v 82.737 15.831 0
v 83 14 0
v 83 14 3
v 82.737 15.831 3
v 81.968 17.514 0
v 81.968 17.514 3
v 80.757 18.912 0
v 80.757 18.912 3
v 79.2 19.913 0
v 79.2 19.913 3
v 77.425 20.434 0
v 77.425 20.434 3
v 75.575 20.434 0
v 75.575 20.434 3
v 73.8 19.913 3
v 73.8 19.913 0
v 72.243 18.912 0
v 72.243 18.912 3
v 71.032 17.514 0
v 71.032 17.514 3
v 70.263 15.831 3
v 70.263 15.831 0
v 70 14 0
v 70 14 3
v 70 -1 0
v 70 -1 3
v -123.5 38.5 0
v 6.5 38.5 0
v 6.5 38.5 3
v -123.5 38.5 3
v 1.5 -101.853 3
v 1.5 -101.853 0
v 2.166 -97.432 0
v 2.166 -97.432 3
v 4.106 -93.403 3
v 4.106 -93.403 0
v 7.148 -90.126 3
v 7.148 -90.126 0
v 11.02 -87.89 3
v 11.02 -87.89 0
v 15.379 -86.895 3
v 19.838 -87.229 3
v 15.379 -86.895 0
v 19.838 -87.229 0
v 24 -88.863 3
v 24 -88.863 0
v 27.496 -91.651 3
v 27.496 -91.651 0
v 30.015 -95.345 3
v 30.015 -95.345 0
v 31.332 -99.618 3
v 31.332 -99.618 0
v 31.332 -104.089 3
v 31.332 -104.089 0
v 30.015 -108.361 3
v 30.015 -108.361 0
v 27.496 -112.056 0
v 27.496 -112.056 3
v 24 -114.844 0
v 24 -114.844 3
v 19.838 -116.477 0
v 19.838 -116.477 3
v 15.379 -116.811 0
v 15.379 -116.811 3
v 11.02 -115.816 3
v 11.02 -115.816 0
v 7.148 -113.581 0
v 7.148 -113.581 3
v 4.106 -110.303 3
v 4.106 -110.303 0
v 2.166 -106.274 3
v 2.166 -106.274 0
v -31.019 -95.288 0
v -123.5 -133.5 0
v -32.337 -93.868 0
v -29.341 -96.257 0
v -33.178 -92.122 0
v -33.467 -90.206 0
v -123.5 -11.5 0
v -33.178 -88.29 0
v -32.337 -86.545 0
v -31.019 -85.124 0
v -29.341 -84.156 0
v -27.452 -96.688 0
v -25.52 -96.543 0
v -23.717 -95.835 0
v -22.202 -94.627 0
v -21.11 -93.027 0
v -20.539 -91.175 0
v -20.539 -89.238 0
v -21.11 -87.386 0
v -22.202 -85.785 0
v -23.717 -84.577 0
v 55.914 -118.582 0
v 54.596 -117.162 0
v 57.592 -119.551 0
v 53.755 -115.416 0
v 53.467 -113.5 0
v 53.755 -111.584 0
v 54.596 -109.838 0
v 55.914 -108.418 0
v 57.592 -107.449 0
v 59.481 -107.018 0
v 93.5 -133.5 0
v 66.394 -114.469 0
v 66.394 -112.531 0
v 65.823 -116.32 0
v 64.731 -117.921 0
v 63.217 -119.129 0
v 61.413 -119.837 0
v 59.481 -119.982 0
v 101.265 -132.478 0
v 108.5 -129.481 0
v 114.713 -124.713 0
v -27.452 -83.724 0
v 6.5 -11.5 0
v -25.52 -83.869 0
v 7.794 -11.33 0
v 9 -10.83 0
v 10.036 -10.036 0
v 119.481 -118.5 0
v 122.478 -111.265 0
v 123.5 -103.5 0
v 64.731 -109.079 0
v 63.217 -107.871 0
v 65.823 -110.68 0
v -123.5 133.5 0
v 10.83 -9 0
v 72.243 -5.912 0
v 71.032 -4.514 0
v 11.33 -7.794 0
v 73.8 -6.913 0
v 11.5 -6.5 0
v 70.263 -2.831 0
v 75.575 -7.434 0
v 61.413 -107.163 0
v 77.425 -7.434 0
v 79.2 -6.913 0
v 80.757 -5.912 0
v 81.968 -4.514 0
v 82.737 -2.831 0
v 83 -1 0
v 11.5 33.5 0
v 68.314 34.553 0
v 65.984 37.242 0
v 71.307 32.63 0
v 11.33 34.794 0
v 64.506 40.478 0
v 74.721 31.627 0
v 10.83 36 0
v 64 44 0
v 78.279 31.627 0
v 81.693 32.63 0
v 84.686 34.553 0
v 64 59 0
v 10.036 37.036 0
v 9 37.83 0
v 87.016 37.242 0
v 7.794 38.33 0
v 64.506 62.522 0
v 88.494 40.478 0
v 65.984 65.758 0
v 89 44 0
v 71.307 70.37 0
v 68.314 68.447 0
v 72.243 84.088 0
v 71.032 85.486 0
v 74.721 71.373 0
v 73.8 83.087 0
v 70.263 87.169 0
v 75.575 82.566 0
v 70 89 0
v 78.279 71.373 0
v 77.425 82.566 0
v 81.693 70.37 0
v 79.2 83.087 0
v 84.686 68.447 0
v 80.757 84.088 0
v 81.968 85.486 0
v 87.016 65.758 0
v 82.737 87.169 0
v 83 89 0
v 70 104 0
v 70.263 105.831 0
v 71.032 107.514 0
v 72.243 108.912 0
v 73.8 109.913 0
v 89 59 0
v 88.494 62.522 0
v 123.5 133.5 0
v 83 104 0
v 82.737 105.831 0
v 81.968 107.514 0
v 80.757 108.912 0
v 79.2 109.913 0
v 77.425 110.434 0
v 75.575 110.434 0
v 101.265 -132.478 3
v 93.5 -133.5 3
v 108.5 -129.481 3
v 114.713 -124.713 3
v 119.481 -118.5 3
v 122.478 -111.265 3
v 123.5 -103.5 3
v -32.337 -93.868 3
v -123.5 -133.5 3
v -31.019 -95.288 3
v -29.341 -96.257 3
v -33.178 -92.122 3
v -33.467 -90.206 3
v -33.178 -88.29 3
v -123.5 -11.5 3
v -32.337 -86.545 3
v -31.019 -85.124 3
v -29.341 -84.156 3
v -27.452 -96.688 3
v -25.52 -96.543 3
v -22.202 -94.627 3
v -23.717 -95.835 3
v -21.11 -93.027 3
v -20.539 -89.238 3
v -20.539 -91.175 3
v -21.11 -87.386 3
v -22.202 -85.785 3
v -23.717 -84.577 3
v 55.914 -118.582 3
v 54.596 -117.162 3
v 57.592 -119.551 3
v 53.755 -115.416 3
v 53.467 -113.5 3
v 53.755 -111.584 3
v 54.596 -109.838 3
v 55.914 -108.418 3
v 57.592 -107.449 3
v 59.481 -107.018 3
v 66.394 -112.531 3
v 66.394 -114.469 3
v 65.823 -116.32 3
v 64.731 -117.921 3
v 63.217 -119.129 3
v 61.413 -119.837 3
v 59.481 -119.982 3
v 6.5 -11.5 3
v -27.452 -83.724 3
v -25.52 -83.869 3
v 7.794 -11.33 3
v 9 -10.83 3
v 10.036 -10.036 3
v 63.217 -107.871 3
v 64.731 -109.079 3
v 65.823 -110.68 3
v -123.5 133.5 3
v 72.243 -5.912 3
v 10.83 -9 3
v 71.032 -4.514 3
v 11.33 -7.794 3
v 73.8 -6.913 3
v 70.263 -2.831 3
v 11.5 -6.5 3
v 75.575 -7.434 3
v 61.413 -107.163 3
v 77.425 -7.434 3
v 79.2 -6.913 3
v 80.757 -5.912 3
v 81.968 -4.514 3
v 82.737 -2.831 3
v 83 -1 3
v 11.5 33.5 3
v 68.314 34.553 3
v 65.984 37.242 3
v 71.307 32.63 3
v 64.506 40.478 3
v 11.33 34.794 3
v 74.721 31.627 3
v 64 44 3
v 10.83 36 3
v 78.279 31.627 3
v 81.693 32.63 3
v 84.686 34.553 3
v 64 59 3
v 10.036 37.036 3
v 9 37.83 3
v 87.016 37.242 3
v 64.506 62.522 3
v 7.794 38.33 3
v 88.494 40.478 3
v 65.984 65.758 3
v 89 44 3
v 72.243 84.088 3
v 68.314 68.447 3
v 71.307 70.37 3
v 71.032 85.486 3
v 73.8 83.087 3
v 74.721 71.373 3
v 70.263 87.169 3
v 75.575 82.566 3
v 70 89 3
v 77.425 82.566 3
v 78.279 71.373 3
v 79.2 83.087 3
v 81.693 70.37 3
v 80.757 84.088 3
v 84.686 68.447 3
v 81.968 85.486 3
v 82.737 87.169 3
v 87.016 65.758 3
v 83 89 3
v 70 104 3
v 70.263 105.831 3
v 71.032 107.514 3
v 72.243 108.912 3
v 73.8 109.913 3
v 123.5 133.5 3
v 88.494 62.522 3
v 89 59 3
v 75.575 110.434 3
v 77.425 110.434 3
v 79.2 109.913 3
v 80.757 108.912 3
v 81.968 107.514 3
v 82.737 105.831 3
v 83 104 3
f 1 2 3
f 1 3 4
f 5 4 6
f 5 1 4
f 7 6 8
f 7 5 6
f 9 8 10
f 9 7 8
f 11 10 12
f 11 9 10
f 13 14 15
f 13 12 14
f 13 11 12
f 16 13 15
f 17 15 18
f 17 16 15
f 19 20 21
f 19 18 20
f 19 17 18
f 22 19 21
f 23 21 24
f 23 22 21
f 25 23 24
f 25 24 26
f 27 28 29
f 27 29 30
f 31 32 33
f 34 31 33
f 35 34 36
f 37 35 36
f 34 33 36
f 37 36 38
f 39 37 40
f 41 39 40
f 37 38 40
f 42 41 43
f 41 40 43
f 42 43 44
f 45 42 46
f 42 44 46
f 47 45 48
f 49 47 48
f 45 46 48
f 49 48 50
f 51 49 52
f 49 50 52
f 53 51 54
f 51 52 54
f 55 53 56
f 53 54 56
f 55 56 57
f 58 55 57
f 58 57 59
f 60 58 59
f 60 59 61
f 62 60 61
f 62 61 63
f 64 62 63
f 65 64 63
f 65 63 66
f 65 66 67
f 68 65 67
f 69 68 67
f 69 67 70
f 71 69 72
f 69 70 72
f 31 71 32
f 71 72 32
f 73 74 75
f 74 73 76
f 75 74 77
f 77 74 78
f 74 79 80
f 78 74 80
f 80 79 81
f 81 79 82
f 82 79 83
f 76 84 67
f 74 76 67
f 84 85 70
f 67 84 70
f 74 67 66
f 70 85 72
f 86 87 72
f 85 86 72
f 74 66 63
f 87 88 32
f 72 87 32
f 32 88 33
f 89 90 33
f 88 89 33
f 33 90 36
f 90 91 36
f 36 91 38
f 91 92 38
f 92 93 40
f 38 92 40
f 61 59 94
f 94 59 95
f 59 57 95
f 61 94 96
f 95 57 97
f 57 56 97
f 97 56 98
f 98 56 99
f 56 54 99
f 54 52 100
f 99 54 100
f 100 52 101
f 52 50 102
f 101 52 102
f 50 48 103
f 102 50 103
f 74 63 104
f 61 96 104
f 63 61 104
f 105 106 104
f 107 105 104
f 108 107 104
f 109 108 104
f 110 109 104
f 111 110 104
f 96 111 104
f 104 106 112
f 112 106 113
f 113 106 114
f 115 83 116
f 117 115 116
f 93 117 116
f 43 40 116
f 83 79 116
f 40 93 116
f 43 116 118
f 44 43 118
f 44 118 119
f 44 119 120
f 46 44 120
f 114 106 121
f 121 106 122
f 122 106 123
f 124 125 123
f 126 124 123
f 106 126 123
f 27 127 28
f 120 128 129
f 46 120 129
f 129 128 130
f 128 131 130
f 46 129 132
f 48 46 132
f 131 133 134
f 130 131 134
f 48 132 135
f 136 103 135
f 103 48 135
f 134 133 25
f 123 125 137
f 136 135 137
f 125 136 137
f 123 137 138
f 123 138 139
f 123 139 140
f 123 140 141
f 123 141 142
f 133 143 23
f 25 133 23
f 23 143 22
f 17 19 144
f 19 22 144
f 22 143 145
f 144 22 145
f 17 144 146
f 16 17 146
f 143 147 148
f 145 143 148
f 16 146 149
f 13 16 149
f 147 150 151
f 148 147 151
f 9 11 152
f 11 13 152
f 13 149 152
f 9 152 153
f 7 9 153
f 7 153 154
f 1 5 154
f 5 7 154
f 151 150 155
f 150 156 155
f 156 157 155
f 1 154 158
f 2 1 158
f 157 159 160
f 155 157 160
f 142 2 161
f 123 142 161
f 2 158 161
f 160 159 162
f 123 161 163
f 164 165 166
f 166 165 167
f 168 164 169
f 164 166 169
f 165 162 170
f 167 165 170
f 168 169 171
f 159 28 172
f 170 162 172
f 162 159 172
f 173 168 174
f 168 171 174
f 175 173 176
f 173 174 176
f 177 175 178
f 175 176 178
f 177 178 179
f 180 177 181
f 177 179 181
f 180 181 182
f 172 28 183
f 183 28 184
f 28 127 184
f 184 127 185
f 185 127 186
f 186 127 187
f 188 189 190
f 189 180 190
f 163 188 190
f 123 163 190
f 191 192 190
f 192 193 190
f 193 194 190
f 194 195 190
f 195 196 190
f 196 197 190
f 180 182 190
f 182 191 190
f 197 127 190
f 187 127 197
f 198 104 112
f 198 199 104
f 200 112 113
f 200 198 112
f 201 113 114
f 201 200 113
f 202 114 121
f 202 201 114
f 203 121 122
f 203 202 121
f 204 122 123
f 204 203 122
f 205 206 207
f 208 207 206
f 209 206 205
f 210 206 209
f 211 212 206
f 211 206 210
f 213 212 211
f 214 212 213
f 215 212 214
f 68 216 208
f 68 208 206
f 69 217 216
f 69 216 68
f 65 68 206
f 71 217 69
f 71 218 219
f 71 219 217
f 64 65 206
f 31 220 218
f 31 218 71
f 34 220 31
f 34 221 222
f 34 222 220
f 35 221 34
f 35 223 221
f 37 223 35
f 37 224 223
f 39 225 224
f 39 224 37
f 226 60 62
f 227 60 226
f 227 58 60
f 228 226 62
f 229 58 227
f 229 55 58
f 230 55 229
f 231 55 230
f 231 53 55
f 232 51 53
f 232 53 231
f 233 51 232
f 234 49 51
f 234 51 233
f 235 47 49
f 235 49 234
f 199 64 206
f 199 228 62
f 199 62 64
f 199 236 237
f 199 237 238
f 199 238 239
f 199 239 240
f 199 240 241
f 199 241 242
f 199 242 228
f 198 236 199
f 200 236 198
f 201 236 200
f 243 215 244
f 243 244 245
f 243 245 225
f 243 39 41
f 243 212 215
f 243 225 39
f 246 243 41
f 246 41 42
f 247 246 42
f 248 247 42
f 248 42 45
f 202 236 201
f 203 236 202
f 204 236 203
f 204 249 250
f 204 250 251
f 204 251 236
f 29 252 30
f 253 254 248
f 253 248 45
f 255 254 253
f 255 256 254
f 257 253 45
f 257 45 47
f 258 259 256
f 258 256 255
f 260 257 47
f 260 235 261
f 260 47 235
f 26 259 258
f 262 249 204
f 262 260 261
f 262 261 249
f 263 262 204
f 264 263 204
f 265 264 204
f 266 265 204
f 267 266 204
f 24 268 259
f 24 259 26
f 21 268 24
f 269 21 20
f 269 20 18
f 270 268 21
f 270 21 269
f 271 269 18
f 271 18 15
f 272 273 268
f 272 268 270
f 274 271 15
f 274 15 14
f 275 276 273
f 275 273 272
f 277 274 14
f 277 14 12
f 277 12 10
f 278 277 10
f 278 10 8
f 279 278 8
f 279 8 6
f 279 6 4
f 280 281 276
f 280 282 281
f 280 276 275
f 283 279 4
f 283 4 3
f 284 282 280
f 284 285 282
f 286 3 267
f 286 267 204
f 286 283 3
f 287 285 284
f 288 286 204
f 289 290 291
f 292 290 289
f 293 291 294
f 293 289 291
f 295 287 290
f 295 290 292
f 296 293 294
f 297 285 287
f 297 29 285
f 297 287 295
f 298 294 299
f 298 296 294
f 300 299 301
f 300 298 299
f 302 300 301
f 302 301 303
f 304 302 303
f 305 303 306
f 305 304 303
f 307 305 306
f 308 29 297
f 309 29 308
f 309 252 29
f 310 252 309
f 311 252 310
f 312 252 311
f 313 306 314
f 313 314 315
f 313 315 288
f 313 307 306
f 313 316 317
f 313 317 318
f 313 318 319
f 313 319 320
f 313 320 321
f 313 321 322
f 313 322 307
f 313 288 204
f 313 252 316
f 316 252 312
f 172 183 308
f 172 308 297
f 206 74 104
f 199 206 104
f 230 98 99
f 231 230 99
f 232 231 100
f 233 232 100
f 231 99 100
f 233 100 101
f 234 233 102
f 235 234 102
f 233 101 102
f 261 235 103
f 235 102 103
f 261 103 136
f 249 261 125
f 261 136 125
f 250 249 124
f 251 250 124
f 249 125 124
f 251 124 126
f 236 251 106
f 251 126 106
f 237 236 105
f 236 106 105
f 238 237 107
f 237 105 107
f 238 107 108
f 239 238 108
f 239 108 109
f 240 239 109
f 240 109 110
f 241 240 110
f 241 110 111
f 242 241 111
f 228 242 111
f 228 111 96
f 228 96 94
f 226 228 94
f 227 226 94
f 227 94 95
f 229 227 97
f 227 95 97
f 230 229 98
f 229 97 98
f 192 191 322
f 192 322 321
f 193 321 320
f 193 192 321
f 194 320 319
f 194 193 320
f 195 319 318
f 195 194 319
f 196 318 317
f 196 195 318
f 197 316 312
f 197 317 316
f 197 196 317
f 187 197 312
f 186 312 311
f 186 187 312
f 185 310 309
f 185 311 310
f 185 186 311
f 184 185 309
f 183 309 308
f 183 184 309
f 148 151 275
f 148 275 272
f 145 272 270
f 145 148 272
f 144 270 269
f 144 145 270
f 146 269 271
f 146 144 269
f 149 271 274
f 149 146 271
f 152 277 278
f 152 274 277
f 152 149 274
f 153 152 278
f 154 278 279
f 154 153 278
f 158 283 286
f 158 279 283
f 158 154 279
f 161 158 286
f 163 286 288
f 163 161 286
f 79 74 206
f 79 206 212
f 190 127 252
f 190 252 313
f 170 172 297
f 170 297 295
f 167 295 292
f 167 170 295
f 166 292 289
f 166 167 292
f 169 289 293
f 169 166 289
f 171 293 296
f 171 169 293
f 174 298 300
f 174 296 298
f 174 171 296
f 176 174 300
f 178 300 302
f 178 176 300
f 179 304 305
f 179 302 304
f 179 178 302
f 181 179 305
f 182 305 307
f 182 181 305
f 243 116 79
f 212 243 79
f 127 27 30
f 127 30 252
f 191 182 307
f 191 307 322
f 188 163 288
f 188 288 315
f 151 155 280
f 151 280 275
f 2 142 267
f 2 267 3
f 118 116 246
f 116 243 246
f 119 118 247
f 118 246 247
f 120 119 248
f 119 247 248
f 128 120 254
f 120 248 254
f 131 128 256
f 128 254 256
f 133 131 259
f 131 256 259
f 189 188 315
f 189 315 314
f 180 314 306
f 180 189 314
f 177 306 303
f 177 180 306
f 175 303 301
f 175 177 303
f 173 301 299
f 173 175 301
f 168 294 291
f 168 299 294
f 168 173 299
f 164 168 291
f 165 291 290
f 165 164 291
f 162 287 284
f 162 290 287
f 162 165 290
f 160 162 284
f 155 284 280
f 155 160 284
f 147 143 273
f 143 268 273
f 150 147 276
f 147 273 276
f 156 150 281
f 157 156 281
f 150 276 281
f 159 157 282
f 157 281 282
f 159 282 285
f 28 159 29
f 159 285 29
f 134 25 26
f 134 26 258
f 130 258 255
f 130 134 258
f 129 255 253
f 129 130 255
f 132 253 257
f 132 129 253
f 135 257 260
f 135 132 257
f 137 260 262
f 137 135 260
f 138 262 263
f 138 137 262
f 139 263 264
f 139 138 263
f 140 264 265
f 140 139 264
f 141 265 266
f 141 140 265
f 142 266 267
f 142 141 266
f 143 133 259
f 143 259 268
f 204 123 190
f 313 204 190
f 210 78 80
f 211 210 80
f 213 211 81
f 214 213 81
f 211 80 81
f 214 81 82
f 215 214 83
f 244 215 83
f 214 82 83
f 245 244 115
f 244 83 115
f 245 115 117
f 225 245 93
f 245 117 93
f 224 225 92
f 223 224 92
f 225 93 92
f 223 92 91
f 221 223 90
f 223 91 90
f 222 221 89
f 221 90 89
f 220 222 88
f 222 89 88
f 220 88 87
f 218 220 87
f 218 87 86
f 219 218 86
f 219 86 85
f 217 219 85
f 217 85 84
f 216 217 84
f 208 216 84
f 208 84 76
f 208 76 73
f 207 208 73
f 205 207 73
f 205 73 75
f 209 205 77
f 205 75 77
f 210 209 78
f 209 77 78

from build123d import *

# Parameters (mm, degrees)
ESQUISSE1_W             = 247
ESQUISSE1_H             = 267
ESQUISSE1_R             = 12.5
ESQUISSE1_R_2           = 6.5
BOSS_EXTRU_1_DEPTH      = 3
ESQUISSE3_R             = 6.5
ESQUISSE3_R_2           = 15
ENL_V_MAT_EXTRU_2_DEPTH = 3
ESQUISSE4_W             = 135
ESQUISSE4_H             = 50
ENL_V_MAT_EXTRU_3_DEPTH = 10
CONG_1_R                = 5
CONG_2_R                = 30
ENL_V_MAT_EXTRU_4_DEPTH = 10


with BuildPart() as part:
    # Esquisse1 → Boss.-Extru.1 (new body)
    with BuildSketch(Plane.XY):
        Rectangle(ESQUISSE1_W, ESQUISSE1_H)
        with Locations((76.5, 51.5)):
            Circle(ESQUISSE1_R, mode=Mode.SUBTRACT)
        with Locations((76.5, 96.5)):
            Circle(ESQUISSE1_R_2, mode=Mode.SUBTRACT)
        with Locations((76.5, 6.5)):
            Circle(ESQUISSE1_R_2, mode=Mode.SUBTRACT)
    extrude(amount=BOSS_EXTRU_1_DEPTH)

    # Esquisse3 → Enlèv. mat.-Extru.2 (cut)
    with BuildSketch(Plane(origin=(0, 0, 0), x_dir=(-1, 0, 0), z_dir=(0, 0, -1))):
        with Locations((-59.966662183, -113.5)):
            Circle(ESQUISSE3_R)
        with Locations((-16.5, -101.85314297)):
            Circle(ESQUISSE3_R_2)
        with Locations((26.966662183, -90.206285941)):
            Circle(ESQUISSE3_R)
    extrude(amount=-ENL_V_MAT_EXTRU_2_DEPTH, mode=Mode.SUBTRACT)

    # Esquisse4 → Enlèv. mat.-Extru.3 (cut)
    with BuildSketch(Plane(origin=(0, 0, 0), x_dir=(-1, 0, 0), z_dir=(0, 0, -1))):
        with Locations((56, 13.5)):
            Rectangle(ESQUISSE4_W, ESQUISSE4_H)
    extrude(amount=-ENL_V_MAT_EXTRU_3_DEPTH, mode=Mode.SUBTRACT)

    # Congé1
    cong_1_edges = [part.edges().sort_by_distance(p)[0] for p in [
        (11.5, -11.5, 1.5),
        (11.5, 38.5, 1.5),
    ]]
    fillet(cong_1_edges, radius=CONG_1_R)

    # Congé2
    cong_2_edges = [part.edges().sort_by_distance(p)[0] for p in [
        (123.5, -133.5, 1.5),
    ]]
    fillet(cong_2_edges, radius=CONG_2_R)

    # Esquisse5 → Enlèv. mat.-Extru.4 (cut)
    with BuildSketch(Plane(origin=(0, 0, 0), x_dir=(-1, 0, 0), z_dir=(0, 0, -1))):
        with BuildLine():
            Line((-83, 89), (-83, 104))
            ThreePointArc((-83, 104), (-76.5, 110.5), (-70, 104))
            Line((-70, 104), (-70, 89))
            ThreePointArc((-70, 89), (-76.5, 82.5), (-83, 89))
        make_face()
        with BuildLine():
            Line((-83, -1), (-83, 14))
            ThreePointArc((-83, 14), (-76.5, 20.5), (-70, 14))
            Line((-70, 14), (-70, -1))
            ThreePointArc((-70, -1), (-76.5, -7.5), (-83, -1))
        make_face()
        with BuildLine():
            Line((-89, 44), (-89, 59))
            ThreePointArc((-89, 59), (-76.5, 71.5), (-64, 59))
            Line((-64, 59), (-64, 44))
            ThreePointArc((-64, 44), (-76.5, 31.5), (-89, 44))
        make_face()
    extrude(amount=-ENL_V_MAT_EXTRU_4_DEPTH, mode=Mode.SUBTRACT)


solid = part.part
